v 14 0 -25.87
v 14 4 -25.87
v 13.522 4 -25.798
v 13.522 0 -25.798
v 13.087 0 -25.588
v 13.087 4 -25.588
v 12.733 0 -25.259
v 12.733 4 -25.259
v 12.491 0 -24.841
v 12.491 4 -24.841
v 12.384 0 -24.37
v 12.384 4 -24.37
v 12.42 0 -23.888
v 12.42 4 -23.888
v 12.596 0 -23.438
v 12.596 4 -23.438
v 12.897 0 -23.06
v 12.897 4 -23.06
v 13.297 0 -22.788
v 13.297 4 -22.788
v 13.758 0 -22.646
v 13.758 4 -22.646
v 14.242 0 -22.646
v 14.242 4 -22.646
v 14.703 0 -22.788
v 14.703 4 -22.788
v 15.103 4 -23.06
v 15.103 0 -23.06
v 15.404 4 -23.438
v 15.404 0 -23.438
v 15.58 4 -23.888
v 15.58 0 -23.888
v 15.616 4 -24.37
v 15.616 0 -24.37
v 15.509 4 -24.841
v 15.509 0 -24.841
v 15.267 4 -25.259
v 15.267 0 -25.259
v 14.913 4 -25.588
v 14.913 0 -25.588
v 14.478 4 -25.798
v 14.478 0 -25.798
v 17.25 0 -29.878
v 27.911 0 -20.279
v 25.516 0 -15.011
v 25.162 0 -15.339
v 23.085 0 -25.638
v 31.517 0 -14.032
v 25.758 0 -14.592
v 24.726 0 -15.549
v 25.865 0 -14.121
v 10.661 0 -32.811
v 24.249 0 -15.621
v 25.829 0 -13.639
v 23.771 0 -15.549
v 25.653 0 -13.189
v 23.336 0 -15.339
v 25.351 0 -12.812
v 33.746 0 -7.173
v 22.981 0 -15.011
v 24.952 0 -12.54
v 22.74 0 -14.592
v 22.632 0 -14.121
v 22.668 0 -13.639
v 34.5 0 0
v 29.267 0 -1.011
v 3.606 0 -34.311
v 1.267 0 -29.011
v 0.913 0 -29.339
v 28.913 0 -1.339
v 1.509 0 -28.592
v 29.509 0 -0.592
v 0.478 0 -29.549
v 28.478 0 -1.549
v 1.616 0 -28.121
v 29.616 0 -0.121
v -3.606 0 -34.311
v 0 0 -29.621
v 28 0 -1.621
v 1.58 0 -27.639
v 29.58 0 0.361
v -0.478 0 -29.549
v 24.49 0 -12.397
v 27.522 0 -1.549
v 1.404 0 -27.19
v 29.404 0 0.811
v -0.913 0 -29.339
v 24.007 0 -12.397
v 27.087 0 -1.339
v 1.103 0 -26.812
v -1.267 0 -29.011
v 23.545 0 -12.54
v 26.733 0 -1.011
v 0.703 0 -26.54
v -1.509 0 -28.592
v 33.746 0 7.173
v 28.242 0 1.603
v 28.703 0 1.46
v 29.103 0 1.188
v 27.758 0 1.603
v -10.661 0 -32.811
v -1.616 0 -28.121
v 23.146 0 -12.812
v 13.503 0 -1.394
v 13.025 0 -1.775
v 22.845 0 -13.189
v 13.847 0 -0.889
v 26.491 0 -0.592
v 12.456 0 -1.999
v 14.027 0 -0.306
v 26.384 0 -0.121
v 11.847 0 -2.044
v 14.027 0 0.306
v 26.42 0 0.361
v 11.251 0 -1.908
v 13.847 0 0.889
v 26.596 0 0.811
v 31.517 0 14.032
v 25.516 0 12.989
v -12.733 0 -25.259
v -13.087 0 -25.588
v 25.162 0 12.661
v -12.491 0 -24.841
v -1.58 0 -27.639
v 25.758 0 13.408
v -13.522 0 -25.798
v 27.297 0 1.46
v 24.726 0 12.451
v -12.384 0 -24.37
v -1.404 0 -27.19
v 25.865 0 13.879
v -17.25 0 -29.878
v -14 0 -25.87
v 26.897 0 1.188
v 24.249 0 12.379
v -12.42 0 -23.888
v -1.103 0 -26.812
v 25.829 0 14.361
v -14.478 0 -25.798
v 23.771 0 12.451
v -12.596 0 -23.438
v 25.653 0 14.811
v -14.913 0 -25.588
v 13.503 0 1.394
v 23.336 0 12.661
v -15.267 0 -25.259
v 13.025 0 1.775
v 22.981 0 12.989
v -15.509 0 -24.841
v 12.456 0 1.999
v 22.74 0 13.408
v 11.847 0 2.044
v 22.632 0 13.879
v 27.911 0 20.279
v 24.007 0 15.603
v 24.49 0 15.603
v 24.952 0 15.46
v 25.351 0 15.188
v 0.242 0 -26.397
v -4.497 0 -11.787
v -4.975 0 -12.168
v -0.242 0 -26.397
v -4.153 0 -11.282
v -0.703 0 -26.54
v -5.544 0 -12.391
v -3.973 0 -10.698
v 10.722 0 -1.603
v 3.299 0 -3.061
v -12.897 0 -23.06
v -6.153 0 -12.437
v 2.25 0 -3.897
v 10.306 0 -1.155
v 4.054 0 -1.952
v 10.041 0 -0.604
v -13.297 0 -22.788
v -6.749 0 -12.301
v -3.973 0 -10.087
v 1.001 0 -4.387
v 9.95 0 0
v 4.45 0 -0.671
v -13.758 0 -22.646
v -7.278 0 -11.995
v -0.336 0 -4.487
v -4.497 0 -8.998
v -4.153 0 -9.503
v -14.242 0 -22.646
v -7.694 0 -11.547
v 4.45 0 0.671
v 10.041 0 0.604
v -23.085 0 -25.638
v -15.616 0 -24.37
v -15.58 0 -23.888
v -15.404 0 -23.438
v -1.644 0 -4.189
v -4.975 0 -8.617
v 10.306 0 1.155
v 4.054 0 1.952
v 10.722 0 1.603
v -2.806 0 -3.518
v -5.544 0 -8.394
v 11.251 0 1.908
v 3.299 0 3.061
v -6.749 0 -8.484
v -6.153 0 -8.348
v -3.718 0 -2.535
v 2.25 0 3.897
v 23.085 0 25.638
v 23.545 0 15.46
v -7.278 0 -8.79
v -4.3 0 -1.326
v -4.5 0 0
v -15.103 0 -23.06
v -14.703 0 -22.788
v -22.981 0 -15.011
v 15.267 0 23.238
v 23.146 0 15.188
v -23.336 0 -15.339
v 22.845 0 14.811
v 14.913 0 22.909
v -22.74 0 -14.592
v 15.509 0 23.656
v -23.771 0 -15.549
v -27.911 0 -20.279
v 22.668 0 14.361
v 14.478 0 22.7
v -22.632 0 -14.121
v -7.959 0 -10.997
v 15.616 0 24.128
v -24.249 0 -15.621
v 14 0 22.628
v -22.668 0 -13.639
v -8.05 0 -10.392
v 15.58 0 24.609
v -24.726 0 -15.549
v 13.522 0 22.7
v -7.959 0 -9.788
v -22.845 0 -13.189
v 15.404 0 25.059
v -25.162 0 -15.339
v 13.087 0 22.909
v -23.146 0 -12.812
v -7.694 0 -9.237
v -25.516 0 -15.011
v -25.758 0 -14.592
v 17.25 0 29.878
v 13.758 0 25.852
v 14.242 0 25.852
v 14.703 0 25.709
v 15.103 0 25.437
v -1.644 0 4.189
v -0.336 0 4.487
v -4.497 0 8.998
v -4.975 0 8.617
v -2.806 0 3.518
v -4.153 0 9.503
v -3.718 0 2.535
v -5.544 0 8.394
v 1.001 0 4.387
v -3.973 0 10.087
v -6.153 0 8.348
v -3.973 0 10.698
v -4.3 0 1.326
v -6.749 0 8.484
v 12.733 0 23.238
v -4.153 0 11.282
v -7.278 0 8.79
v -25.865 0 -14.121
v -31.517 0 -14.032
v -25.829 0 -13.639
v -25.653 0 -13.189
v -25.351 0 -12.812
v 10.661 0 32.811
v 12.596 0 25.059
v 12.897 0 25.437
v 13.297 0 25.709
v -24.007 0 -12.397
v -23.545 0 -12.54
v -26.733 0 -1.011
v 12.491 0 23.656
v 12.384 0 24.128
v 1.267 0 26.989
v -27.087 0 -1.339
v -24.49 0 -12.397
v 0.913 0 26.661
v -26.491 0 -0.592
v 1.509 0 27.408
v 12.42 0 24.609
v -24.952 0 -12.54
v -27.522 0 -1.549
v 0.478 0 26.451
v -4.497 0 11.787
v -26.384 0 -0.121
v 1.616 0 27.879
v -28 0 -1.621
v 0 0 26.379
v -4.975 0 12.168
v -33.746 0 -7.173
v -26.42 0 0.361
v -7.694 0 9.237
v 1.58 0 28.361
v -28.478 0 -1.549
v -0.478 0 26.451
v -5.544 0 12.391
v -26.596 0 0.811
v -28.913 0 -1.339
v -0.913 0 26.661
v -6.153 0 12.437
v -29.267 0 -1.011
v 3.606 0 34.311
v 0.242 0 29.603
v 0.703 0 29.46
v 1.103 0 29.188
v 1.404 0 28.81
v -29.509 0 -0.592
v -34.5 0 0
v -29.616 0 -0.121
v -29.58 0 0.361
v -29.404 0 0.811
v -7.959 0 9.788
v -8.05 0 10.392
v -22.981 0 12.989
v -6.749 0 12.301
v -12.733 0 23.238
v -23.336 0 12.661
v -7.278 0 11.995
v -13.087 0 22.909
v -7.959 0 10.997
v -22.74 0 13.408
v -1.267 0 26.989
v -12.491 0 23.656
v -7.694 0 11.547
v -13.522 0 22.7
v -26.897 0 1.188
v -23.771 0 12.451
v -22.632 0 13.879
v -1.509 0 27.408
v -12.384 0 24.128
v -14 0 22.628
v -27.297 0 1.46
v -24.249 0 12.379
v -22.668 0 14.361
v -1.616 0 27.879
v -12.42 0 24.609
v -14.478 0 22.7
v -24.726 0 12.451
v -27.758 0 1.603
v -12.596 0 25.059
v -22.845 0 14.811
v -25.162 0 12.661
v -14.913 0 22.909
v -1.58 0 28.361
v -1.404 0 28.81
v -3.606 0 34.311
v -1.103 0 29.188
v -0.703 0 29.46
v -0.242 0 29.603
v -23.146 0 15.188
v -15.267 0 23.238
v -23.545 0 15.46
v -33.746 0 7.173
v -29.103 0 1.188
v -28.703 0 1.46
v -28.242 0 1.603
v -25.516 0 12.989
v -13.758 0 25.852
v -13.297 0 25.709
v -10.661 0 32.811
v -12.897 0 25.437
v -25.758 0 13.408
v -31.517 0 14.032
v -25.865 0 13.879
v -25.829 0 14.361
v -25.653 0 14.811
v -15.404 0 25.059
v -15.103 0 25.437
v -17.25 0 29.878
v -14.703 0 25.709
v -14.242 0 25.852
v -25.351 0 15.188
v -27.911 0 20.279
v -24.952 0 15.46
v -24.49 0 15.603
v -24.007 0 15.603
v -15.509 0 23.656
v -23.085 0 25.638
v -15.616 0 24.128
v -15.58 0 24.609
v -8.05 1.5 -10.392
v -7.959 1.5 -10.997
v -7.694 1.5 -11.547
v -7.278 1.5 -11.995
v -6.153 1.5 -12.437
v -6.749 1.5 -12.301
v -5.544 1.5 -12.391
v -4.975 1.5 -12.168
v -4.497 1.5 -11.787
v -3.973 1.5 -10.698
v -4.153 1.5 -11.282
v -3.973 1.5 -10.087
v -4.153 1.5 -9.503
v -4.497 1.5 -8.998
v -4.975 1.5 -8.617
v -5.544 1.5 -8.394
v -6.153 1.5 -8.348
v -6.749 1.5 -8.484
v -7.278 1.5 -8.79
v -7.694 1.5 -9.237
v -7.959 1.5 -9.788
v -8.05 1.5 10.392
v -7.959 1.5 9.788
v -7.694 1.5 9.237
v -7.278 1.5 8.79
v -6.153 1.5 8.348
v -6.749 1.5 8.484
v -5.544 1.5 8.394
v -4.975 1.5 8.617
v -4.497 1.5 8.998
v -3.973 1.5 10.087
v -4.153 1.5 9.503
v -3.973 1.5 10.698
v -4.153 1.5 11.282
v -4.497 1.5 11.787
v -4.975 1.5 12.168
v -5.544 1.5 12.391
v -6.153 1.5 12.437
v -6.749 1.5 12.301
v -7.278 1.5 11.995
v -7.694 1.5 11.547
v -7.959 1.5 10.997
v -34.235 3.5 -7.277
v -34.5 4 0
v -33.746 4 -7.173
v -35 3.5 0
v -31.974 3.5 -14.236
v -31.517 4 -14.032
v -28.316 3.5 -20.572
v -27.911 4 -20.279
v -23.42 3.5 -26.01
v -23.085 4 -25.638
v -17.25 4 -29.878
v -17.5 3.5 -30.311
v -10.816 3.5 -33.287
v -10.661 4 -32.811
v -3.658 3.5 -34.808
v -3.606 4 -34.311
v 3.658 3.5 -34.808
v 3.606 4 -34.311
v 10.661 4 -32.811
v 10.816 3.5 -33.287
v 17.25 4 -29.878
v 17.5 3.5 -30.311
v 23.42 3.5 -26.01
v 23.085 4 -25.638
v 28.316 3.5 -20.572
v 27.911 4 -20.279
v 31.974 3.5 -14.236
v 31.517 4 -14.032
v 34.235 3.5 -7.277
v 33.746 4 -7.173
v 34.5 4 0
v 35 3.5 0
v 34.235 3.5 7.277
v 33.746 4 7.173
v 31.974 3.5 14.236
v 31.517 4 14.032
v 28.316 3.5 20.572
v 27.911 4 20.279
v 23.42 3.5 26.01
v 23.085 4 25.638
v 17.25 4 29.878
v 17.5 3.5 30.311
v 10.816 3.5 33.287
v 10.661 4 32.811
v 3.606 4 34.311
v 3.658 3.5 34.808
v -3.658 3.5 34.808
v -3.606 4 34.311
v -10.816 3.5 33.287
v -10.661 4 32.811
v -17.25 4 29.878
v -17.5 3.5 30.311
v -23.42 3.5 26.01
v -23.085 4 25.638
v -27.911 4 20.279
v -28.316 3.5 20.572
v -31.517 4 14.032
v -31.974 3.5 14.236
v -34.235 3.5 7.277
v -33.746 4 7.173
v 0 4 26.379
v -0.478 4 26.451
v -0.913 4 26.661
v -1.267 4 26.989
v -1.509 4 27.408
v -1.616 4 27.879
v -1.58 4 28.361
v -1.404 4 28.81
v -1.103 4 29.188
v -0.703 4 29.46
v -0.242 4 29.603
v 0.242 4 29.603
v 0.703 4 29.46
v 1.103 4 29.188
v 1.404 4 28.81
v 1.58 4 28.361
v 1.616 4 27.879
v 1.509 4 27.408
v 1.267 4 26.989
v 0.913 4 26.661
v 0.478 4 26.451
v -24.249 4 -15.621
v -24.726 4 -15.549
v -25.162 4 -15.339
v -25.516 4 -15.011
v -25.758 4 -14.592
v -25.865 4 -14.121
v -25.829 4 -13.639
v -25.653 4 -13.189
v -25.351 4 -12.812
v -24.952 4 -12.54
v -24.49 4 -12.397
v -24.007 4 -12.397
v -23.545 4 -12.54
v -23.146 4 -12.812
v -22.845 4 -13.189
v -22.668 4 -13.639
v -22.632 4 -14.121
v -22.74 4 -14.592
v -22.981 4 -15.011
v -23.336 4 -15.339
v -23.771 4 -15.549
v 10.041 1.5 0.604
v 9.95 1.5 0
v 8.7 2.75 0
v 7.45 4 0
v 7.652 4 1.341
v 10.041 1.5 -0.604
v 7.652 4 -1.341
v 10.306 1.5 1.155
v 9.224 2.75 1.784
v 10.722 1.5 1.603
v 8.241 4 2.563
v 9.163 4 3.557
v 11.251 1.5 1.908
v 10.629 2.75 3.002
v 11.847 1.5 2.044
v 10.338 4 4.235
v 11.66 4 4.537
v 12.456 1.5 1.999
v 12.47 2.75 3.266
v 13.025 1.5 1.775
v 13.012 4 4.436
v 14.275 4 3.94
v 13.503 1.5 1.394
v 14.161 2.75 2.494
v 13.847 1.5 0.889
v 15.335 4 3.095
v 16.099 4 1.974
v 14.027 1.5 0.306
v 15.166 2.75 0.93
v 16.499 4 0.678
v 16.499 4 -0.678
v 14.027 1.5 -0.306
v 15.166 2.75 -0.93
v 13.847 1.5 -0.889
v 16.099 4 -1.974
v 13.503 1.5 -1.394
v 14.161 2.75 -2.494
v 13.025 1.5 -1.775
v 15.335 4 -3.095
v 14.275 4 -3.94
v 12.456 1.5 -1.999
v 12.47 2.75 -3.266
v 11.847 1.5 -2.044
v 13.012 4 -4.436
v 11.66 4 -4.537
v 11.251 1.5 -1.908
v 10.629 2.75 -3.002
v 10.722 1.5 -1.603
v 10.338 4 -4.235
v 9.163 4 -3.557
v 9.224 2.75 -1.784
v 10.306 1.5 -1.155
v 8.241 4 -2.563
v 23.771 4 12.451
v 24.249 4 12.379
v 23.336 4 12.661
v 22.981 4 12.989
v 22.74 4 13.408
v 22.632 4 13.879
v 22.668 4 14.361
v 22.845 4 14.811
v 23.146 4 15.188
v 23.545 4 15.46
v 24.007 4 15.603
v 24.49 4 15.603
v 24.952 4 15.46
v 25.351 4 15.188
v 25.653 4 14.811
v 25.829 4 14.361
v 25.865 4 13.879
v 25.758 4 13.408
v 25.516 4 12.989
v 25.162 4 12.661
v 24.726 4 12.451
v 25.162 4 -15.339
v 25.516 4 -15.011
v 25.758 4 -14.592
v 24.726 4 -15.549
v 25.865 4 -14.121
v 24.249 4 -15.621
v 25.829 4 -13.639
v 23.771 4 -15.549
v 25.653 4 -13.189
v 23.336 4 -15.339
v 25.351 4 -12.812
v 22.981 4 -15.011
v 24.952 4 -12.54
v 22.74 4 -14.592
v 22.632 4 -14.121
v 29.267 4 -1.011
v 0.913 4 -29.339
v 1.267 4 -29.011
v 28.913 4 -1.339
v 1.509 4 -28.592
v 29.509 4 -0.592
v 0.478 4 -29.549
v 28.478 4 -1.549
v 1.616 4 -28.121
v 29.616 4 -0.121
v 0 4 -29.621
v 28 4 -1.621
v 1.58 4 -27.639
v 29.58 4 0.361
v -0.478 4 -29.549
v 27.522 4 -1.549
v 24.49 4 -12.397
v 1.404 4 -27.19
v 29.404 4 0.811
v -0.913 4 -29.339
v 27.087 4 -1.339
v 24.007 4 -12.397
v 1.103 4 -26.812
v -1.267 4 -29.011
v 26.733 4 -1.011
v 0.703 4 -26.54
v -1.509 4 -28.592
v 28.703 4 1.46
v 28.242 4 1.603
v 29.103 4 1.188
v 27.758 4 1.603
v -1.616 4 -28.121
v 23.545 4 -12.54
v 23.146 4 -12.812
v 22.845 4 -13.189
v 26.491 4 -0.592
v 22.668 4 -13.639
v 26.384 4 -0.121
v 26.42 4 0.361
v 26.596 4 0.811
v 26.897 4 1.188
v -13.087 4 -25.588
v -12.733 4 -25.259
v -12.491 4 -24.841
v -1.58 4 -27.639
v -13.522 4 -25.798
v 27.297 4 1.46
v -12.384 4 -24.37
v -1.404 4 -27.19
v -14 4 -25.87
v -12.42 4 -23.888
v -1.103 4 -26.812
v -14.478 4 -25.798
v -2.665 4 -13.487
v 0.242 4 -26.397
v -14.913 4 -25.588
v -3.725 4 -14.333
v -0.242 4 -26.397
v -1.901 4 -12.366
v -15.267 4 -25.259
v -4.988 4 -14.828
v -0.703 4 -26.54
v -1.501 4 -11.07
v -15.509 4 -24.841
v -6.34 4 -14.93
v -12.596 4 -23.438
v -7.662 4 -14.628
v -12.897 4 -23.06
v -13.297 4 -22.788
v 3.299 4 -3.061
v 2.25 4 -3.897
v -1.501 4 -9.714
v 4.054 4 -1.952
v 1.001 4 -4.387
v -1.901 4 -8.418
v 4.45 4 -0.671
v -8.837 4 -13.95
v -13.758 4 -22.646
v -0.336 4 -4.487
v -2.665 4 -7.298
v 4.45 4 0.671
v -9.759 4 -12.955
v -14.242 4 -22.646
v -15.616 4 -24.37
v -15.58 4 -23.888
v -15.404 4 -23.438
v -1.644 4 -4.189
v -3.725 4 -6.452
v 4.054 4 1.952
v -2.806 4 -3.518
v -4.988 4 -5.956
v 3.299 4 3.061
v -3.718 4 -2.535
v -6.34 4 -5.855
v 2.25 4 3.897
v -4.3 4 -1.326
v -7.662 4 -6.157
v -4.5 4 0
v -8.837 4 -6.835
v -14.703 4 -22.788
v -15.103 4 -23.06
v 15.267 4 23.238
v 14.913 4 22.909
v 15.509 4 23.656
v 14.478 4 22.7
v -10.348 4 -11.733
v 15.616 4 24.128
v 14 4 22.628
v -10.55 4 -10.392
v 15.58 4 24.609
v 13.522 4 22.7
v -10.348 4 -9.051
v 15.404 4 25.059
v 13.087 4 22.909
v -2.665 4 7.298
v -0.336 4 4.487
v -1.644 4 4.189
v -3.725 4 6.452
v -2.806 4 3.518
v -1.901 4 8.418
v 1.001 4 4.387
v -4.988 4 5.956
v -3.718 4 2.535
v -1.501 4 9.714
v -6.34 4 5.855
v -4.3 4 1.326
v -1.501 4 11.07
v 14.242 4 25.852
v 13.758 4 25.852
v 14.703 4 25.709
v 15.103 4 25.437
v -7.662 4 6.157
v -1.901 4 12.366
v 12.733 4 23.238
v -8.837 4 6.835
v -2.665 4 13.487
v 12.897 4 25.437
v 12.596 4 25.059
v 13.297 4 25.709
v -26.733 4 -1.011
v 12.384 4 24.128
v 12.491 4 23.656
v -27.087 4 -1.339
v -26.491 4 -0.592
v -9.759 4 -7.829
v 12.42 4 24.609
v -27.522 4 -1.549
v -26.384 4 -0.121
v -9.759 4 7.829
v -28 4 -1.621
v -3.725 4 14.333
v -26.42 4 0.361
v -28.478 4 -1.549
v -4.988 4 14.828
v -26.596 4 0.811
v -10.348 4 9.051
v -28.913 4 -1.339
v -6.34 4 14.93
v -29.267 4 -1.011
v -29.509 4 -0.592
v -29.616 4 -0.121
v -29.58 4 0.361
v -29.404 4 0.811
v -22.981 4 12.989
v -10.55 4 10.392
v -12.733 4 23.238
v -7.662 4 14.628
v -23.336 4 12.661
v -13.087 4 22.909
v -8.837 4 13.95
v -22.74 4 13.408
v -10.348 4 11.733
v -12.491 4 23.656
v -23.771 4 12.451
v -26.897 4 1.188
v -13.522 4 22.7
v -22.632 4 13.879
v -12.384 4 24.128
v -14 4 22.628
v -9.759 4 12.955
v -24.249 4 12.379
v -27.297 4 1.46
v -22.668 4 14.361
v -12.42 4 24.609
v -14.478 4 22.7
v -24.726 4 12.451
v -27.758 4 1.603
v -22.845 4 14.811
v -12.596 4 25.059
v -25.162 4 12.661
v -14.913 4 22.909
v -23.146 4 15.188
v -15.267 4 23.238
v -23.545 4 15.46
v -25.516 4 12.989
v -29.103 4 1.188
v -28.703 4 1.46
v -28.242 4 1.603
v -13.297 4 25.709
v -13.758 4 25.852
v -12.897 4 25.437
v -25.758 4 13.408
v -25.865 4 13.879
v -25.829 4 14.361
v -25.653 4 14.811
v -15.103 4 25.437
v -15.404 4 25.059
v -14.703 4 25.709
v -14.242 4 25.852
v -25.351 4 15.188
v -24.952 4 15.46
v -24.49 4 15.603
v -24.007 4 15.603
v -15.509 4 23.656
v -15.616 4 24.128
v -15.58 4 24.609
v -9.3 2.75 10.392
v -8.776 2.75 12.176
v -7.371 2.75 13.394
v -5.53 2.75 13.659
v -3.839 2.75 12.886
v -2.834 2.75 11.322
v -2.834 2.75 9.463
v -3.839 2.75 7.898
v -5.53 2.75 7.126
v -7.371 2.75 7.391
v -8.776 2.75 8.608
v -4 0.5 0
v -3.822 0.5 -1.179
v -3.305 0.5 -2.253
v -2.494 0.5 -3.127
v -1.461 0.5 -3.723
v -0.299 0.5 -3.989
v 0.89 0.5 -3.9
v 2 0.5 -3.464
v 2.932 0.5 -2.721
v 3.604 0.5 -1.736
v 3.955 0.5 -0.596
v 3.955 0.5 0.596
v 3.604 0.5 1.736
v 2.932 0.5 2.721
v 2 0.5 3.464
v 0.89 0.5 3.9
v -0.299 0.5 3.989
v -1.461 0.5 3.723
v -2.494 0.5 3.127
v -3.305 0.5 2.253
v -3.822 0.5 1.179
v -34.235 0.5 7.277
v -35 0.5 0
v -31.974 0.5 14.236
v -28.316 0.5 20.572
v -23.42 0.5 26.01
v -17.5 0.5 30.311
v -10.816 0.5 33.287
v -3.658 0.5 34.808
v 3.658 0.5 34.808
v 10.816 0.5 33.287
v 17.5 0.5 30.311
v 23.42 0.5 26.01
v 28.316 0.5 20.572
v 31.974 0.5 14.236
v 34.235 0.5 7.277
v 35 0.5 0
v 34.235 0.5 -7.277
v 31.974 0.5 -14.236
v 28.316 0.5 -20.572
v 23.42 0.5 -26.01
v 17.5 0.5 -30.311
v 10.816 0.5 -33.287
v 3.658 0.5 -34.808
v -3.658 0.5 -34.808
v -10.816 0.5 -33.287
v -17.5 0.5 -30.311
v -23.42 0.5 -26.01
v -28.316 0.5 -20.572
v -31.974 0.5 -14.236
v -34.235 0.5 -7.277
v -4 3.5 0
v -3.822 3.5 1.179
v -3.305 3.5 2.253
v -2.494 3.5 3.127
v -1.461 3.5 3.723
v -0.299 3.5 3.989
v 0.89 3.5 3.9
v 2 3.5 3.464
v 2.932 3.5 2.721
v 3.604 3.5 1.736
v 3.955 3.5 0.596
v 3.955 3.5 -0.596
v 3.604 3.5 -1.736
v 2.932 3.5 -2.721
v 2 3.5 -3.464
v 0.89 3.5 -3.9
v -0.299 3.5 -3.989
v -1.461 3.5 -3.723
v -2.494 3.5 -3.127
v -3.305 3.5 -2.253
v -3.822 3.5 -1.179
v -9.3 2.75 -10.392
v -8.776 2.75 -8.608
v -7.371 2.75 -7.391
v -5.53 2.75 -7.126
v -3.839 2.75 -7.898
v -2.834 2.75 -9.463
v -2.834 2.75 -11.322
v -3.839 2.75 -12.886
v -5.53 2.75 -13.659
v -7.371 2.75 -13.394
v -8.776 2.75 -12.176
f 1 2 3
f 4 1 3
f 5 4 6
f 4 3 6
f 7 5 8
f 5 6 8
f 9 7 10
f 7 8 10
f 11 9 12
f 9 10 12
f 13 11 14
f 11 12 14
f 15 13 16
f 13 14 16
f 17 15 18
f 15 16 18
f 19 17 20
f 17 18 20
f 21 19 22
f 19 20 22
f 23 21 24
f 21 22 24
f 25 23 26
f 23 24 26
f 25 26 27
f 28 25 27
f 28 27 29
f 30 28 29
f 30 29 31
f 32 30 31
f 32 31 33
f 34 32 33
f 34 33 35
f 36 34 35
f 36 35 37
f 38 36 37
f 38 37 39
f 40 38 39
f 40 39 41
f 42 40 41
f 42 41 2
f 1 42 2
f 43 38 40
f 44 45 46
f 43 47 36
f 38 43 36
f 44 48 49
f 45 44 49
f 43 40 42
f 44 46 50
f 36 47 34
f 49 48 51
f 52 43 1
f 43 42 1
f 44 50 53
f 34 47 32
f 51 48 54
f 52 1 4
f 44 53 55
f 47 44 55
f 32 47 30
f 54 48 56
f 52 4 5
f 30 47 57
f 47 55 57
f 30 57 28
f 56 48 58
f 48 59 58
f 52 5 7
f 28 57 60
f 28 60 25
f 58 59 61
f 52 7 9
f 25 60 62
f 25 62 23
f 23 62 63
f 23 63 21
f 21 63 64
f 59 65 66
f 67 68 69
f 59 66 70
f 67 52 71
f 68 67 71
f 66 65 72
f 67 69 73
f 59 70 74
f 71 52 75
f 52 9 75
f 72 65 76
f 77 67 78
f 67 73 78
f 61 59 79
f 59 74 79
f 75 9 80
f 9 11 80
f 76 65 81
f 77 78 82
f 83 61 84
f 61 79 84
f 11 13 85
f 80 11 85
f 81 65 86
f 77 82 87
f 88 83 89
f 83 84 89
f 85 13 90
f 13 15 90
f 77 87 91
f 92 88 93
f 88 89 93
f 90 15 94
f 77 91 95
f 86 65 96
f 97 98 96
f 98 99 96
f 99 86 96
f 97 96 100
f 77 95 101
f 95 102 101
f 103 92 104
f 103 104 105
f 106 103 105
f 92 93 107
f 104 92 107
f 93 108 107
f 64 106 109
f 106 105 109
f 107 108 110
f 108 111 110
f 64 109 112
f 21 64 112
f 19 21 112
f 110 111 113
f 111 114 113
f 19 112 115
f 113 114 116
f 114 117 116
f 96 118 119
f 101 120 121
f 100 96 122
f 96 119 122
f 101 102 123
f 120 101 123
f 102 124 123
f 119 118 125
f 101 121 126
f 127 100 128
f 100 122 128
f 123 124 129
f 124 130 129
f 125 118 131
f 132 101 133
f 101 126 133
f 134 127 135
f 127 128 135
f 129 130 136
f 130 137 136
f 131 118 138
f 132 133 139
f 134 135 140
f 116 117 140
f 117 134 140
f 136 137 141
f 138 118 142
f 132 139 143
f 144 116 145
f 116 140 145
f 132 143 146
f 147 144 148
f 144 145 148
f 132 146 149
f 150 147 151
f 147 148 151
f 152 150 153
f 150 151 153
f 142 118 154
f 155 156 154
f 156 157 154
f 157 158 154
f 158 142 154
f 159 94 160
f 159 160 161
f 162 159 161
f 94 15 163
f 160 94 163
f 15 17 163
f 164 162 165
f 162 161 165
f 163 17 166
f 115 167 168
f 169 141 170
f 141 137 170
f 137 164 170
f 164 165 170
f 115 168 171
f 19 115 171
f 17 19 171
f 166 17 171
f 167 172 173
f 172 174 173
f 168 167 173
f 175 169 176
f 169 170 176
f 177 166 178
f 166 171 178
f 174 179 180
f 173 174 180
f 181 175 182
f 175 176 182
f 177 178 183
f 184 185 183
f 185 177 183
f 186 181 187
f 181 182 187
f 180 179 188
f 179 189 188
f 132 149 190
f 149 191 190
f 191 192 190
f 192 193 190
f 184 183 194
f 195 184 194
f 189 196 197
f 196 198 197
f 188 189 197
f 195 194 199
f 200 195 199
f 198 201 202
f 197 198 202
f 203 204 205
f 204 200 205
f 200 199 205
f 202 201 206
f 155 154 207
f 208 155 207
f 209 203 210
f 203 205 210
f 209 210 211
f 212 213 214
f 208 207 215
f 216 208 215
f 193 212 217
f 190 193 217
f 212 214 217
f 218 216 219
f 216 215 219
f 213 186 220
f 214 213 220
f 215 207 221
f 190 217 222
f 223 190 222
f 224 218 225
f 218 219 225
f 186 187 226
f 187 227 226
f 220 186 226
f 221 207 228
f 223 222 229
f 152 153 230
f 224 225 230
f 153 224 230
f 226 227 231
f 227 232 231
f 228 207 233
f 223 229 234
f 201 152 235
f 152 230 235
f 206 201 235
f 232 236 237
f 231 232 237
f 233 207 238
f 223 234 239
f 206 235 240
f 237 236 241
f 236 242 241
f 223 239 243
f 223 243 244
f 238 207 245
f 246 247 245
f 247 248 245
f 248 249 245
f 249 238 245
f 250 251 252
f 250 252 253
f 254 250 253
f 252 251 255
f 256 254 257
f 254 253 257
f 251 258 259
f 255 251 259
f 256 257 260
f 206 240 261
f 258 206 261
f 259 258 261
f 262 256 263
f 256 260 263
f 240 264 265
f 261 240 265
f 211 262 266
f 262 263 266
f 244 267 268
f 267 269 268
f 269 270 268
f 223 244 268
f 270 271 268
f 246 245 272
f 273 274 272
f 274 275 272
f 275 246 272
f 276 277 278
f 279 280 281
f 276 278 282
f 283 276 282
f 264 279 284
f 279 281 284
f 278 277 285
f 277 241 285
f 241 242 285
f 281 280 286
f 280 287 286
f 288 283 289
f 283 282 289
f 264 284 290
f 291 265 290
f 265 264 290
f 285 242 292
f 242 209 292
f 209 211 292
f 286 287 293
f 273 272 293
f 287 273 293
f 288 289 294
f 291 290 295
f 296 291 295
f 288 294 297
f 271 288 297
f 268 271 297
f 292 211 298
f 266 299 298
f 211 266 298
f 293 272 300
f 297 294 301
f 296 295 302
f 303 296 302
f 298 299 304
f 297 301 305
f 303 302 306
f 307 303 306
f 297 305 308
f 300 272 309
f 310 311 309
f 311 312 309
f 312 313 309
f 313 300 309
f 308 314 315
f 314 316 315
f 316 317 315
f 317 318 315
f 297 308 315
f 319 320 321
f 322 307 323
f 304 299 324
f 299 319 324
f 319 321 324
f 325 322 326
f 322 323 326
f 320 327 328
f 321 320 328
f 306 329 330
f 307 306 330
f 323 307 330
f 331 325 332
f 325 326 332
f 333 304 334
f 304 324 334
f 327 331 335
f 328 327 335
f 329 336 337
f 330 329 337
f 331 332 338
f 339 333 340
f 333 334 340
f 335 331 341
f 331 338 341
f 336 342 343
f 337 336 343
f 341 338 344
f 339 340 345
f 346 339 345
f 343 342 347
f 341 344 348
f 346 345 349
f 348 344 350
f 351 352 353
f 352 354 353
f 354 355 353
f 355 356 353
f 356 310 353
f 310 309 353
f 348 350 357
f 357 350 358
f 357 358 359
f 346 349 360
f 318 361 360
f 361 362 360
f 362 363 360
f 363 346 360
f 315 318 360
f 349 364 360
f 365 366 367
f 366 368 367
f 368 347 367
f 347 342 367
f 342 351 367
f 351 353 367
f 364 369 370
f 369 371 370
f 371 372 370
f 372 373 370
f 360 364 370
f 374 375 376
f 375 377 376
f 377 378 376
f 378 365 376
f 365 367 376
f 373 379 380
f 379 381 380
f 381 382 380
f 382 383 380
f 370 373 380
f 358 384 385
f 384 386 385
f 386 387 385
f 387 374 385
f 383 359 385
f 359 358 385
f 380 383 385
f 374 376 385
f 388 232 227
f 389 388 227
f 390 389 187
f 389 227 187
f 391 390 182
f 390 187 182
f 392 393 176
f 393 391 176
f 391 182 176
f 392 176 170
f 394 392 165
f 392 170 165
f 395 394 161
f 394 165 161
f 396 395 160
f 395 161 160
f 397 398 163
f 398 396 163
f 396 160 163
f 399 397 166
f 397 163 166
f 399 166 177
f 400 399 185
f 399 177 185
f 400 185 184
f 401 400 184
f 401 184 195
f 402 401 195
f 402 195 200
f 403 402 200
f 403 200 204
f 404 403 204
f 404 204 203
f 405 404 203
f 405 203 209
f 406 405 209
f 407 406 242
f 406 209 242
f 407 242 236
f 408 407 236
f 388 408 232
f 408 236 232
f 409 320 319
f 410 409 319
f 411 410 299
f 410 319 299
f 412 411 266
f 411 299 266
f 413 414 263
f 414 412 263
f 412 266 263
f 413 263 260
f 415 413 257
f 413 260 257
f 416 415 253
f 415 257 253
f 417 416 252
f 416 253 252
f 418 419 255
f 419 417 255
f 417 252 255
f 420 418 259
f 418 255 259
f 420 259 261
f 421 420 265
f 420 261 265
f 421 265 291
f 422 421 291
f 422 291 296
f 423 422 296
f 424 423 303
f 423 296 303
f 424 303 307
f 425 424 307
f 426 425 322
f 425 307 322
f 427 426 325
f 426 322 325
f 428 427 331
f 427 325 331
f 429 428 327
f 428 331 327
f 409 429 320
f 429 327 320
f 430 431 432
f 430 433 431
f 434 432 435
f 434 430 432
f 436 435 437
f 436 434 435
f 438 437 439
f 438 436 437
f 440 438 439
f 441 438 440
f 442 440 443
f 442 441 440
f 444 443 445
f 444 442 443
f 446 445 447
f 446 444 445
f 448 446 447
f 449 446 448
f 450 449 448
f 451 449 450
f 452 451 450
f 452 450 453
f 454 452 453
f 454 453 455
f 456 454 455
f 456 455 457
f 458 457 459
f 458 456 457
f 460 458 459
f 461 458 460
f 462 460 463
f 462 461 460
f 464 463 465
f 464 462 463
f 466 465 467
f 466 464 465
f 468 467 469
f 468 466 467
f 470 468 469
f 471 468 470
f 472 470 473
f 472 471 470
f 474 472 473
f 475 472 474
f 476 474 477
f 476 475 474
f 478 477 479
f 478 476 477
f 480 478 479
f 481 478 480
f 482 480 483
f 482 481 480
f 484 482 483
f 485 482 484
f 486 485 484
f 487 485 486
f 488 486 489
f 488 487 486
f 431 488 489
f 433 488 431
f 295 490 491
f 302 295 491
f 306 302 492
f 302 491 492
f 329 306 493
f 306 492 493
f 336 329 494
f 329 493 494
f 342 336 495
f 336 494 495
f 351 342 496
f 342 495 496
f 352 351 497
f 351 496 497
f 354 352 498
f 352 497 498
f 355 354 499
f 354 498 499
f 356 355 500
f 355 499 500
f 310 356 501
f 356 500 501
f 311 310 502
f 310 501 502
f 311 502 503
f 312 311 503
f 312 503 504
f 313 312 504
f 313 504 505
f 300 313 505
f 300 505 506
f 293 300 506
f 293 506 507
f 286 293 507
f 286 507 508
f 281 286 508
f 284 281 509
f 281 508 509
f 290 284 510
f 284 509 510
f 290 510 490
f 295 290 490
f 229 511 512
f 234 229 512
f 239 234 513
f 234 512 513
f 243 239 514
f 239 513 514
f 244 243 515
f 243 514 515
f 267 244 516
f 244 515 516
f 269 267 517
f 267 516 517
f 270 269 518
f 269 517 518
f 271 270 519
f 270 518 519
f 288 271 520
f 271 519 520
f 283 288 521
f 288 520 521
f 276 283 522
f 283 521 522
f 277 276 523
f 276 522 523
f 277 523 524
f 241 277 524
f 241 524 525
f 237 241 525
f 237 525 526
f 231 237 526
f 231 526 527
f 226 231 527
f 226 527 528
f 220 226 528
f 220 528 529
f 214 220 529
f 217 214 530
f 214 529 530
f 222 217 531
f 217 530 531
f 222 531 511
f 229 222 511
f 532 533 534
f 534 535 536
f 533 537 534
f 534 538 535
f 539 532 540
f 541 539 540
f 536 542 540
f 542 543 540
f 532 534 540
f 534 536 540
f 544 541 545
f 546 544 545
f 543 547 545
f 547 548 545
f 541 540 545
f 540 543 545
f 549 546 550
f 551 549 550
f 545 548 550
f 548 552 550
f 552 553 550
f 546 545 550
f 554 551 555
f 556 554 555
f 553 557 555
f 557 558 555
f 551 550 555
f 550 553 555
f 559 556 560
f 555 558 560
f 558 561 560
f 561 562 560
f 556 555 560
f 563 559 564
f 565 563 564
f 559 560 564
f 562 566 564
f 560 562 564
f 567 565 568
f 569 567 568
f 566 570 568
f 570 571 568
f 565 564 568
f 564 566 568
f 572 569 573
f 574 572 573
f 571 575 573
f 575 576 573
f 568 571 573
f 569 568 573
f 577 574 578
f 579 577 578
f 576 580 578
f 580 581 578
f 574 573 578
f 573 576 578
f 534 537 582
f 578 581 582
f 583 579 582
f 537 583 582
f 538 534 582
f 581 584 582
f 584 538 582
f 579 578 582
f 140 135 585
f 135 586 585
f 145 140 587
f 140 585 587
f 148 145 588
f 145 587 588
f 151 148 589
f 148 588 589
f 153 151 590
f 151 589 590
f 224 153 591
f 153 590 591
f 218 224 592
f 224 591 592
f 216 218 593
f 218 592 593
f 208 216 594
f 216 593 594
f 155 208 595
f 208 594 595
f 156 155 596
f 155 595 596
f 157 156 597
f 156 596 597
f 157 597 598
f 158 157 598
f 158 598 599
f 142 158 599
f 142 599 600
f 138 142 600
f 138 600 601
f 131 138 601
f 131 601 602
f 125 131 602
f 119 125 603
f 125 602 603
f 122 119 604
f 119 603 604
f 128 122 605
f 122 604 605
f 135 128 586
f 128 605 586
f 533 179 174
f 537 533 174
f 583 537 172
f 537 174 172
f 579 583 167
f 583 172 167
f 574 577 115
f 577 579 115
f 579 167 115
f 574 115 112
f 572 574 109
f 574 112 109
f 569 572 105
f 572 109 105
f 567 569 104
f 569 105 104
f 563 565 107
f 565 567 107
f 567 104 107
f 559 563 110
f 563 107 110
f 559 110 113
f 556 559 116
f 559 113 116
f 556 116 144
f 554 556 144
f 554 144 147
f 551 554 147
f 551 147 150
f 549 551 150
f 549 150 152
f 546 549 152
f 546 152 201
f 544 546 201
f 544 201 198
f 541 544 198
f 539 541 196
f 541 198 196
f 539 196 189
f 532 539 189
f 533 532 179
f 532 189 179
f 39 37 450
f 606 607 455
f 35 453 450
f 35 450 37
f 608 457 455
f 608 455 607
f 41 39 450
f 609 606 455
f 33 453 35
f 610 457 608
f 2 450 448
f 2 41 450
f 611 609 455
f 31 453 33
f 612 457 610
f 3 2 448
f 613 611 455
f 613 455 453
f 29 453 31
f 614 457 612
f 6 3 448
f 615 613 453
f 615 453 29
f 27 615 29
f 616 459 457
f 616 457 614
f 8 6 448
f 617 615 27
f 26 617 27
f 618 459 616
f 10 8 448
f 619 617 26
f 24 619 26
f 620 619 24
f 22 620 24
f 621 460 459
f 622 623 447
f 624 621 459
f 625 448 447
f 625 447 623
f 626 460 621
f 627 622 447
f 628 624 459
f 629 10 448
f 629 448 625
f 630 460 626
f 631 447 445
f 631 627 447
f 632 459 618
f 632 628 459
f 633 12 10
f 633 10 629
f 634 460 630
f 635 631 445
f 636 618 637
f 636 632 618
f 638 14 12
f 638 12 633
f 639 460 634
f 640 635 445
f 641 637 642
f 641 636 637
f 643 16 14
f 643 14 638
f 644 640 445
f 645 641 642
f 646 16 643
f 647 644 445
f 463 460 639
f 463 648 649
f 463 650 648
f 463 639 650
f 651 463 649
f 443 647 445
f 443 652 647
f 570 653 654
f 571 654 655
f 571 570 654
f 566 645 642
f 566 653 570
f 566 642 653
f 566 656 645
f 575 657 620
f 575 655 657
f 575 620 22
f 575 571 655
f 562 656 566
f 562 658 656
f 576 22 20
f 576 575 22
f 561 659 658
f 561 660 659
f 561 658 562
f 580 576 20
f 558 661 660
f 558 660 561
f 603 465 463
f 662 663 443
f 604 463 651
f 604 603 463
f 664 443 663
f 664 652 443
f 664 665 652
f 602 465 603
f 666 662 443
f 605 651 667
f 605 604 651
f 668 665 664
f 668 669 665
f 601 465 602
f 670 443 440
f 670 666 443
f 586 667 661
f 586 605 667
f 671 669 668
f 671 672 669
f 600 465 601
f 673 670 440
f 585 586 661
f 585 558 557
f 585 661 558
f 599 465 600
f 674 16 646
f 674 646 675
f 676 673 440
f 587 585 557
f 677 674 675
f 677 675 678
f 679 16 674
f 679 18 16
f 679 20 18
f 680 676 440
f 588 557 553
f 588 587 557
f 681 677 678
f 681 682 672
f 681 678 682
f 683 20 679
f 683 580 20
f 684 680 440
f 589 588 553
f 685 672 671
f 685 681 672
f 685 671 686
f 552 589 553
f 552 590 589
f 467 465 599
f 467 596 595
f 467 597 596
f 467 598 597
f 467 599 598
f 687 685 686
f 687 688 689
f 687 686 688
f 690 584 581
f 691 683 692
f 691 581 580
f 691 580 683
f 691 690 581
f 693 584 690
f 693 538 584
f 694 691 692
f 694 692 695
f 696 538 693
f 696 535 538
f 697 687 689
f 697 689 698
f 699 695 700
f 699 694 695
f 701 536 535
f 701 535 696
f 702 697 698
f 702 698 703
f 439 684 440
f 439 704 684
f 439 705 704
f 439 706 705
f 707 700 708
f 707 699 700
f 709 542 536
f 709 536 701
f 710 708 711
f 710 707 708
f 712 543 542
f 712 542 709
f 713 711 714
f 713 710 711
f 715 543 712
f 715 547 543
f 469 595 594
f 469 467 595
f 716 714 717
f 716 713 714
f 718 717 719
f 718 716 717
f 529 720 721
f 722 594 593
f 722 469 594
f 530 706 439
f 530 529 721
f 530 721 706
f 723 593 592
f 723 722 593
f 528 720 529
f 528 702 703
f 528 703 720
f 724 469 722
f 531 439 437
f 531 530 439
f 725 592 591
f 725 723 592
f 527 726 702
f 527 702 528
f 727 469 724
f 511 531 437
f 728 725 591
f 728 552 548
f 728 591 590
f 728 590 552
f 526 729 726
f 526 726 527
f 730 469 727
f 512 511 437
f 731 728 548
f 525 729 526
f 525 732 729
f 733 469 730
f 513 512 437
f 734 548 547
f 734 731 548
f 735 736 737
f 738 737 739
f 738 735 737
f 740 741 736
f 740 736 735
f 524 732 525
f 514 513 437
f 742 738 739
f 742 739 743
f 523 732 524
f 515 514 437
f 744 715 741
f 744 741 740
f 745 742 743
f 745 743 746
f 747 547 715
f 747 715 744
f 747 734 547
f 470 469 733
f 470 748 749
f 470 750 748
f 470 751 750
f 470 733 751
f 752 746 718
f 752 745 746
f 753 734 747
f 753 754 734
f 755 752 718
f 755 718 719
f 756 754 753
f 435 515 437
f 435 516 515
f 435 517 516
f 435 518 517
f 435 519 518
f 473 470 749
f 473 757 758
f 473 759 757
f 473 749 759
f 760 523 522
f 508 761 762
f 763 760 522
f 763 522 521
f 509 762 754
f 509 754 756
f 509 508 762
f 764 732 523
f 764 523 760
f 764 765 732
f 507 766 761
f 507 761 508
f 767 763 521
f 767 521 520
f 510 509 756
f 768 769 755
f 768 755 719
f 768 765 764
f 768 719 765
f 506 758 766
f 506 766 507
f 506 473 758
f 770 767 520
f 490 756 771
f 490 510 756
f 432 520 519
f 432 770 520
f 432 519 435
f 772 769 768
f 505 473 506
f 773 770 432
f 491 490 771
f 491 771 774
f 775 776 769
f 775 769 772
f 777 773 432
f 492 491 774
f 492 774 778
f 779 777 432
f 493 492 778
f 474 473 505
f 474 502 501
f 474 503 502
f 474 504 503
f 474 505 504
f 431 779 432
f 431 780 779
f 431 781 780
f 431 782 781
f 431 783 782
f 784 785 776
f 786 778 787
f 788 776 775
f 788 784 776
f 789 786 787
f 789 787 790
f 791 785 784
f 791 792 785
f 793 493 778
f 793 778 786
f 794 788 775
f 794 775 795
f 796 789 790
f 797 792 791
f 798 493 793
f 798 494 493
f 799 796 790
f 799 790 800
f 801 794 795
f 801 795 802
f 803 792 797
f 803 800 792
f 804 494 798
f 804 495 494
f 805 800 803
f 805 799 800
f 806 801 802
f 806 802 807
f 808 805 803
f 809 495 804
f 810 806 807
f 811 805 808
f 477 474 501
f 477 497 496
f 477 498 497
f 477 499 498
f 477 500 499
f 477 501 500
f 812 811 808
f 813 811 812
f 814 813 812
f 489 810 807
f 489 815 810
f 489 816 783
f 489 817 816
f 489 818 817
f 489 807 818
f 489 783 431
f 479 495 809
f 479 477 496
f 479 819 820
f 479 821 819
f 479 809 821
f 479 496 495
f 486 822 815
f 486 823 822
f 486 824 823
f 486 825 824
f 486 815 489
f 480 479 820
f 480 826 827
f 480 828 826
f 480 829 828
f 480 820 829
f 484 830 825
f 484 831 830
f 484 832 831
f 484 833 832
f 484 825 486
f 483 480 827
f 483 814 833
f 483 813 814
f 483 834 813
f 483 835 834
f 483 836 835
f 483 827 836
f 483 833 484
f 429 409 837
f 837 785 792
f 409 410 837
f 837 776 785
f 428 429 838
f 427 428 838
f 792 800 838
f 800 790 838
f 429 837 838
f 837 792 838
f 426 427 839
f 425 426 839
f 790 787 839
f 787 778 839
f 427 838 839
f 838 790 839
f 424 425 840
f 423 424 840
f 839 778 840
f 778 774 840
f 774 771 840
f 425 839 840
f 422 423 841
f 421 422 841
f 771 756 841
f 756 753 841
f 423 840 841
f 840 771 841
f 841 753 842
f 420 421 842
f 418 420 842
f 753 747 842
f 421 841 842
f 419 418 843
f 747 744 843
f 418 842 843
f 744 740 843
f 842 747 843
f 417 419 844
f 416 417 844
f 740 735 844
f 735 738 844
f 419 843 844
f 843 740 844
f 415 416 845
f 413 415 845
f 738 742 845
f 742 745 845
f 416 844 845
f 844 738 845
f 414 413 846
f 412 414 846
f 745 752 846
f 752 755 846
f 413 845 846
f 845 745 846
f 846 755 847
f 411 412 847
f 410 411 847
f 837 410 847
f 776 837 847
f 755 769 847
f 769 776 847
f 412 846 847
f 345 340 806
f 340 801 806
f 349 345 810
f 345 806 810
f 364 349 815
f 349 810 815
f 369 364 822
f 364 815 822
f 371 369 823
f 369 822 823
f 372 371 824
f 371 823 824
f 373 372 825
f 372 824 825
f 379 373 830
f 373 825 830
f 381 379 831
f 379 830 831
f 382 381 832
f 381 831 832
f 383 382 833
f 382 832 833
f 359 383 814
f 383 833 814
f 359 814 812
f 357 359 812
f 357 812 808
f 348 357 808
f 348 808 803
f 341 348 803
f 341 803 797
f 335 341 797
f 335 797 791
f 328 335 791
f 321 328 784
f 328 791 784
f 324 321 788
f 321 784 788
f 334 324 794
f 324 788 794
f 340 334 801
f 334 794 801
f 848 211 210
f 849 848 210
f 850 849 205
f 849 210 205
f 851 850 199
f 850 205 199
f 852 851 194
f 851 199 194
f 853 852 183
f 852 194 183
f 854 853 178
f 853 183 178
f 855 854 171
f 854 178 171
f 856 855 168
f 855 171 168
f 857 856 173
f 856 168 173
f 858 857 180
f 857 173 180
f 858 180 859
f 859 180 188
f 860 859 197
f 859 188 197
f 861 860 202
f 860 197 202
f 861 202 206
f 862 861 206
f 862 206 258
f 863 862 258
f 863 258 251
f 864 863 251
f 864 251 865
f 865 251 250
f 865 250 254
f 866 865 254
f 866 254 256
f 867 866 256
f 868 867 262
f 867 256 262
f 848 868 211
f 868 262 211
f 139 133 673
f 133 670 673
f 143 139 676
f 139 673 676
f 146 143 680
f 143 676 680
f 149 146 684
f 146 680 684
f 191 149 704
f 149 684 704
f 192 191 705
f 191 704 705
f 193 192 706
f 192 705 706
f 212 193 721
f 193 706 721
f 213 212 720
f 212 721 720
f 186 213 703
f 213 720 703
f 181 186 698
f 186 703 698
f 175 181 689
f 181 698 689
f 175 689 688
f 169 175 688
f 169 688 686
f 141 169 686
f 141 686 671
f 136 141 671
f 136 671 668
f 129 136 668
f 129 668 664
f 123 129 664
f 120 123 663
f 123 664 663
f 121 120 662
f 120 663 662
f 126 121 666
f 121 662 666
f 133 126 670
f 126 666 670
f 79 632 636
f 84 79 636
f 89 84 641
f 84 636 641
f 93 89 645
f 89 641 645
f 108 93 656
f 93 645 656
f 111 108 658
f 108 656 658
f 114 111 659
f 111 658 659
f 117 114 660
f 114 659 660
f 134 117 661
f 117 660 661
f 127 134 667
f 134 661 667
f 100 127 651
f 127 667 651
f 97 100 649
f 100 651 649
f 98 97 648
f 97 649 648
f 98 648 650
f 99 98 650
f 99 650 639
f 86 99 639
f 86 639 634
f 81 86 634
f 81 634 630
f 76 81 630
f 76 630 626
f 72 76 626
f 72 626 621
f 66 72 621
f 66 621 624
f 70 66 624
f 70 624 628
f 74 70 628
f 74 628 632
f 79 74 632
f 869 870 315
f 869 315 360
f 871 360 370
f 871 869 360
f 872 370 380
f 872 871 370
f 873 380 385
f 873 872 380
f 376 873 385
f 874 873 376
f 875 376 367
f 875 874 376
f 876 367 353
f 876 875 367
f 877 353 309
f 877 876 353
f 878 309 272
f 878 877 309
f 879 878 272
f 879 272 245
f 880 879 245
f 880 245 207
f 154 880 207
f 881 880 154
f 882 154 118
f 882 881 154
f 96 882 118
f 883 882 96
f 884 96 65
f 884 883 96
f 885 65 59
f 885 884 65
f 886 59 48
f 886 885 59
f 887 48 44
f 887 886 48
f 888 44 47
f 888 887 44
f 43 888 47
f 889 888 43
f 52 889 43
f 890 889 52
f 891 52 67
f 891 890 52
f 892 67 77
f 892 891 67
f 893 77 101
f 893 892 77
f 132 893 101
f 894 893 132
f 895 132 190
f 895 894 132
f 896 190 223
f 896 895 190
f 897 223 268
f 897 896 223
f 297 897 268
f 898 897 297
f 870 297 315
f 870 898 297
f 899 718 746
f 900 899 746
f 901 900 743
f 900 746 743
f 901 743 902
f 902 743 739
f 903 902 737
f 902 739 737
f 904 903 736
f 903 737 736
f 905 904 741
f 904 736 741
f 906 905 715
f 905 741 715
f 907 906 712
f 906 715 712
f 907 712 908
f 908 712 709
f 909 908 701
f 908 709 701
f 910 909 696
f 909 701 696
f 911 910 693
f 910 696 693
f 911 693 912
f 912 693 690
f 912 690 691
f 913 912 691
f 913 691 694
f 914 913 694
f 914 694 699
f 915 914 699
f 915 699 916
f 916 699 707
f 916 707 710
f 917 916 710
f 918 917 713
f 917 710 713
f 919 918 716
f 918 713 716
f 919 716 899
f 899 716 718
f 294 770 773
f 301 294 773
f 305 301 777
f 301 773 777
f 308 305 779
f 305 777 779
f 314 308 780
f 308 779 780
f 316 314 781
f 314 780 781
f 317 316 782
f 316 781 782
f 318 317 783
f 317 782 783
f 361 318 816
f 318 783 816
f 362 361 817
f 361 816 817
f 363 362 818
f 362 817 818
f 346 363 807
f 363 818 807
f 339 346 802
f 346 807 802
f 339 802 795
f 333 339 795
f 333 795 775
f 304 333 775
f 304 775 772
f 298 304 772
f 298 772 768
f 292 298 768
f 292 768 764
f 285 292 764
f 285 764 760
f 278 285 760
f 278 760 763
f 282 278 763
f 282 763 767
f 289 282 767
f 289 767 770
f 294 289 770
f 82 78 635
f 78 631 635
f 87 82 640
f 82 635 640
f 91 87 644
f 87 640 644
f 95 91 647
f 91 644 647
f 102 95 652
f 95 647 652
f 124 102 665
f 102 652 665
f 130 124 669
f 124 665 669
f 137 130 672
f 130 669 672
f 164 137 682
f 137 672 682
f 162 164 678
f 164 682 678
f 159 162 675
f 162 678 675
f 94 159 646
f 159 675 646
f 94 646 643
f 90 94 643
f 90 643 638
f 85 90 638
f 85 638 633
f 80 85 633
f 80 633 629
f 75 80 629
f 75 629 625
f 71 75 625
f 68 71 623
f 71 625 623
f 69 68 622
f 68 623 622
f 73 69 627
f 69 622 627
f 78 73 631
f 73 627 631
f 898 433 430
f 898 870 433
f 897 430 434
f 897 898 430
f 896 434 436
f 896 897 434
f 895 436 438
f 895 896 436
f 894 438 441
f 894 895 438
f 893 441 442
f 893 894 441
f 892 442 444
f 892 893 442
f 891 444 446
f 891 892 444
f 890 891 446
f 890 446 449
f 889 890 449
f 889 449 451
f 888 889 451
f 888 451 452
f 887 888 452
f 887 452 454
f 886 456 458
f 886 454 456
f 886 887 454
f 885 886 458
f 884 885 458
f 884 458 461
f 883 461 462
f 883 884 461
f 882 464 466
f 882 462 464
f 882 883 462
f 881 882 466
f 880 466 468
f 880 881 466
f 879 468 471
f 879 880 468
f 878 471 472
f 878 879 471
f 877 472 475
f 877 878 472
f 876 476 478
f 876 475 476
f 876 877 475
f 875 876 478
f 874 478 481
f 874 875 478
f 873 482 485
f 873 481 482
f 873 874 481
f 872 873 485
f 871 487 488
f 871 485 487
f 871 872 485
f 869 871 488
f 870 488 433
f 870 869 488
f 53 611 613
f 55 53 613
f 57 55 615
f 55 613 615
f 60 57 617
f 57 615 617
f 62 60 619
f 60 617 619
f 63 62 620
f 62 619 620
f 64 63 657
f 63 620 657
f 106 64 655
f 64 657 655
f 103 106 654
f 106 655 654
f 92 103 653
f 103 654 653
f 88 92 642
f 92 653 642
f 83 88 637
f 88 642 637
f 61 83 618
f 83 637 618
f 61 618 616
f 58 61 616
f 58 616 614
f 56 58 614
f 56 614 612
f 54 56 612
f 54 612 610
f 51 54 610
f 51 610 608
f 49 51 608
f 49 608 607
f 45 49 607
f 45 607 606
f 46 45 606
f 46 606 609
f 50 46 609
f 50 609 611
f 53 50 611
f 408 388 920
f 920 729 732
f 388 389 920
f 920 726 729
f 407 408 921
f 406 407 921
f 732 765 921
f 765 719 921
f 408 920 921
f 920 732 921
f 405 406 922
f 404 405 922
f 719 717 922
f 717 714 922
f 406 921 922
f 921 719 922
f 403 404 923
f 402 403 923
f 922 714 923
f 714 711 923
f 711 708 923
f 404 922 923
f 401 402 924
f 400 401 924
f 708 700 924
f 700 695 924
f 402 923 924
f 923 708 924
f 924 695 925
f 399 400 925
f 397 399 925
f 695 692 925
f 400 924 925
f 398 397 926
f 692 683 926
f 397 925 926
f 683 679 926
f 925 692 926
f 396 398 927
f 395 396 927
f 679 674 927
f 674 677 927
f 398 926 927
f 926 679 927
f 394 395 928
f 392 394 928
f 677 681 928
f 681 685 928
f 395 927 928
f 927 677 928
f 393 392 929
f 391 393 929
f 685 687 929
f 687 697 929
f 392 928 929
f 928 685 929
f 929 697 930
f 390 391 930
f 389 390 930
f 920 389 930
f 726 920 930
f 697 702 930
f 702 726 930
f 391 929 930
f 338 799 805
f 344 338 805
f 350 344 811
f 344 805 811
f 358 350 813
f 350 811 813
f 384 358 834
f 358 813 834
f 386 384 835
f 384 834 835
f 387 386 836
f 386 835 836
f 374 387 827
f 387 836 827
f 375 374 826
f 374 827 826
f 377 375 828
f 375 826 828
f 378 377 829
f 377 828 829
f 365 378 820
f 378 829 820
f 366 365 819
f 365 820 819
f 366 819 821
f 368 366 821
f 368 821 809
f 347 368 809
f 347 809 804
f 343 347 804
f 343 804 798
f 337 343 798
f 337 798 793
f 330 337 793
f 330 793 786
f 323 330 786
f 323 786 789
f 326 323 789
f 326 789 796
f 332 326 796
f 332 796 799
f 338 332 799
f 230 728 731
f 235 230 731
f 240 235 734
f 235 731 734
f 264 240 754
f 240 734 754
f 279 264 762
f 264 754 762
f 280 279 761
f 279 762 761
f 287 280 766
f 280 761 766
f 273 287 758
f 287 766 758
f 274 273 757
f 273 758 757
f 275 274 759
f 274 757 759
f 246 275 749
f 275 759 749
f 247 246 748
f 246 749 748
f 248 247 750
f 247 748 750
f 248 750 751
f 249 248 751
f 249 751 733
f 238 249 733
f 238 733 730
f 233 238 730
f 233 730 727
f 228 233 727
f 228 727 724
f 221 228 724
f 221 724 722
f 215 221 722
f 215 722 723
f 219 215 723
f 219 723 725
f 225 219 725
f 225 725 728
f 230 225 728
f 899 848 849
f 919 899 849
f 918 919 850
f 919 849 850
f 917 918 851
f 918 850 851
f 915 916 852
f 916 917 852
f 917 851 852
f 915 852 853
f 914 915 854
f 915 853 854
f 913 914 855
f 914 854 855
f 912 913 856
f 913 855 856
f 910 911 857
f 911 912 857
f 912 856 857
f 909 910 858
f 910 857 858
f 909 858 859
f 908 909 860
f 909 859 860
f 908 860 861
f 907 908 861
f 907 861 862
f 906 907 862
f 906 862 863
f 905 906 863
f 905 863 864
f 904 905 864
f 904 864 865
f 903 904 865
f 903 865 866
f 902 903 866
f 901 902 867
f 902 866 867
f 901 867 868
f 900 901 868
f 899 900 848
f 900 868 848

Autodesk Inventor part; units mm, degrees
ref_plane "YZ Plane" through (0, 0, 0) normal (1, 0, 0) x (0, 1, 0)
ref_plane "XZ Plane" through (0, 0, 0) normal (0, 1, 0) x (-1, 0, 0)
ref_plane "XY Plane" through (0, 0, 0) normal (0, 0, 1) x (1, 0, 0)
sketch "Sketch1" plane through (0, 0, 0) normal (0, 1, 0) x (-1, 0, 0)
  circle A0 centre (0, 0) radius 4
  circle A1 centre (0, 0) radius 35
  circle A2 centre (0, -28) radius 2
  circle A3 centre (14, -24.2487) radius 2
  circle A4 centre (24.2487, -14) radius 2
  circle A5 centre (28, 0) radius 2
  circle A6 centre (24.2487, 14) radius 2
  circle A7 centre (14, 24.2487) radius 2
  circle A8 centre (0, 28) radius 2
  circle A9 centre (-14, 24.2487) radius 2
  circle A10 centre (-24.2487, 14) radius 2
  circle A11 centre (-28, 0) radius 2
  circle A12 centre (-24.2487, -14) radius 2
  circle A13 centre (-14, -24.2487) radius 2
  circle A14 centre (-12, 0) radius 2.05
  circle A15 centre (6, -10.3923) radius 2.05
  circle A16 centre (6, 10.3923) radius 2.05
  dimension "d0" = 70
  dimension "d1" = 8
  dimension "d4" = 4
  dimension "d5" = 28
  dimension "d8" = 360
  dimension "d21" = 14.4939
  dimension "d53" = 12
  dimension "d54" = 4.1
  dimension "d57" = 360
extrude "Extrusion1" add sketch "Sketch1" along normal blind 4 contours A1 | A2 | A3 | A4 | A5 | A6 | A7 | A8 | A9 | A10 | A11 | A12 | A13
chamfer "Chamfer2" distance 0.5 angle 45 4 edges at (35, 4, 0) (4, 4, 0) (35, 0, 0) (4, 0, 0)
chamfer "Chamfer3" distance 2.5 angle 45 3 edges at (-3.95, 4, 10.3923) (-3.95, 4, -10.3923) (14.05, 4, 0)
hole "Hole1" at (-24.2487, 0, -14) at (-28, 0, 0) at (-24.2487, 0, 14) at (-14, 0, 24.2487) at (0, 0, 28) at (14, 0, 24.2487) at (24.2487, 0, 14) at (28, 0, 0) at (24.2487, 0, -14) at (14, 0, -24.2487) at (0, 0, -28) at (-14, 0, -24.2487) direction (0, 1, 0) diameter 3.242 depth 15 tip angle 118 thread size "M4x0.7" class "6H" standard "ISO Metric profile"
properties part number "end effector mount 4 mm" material "Aluminum 6061"
